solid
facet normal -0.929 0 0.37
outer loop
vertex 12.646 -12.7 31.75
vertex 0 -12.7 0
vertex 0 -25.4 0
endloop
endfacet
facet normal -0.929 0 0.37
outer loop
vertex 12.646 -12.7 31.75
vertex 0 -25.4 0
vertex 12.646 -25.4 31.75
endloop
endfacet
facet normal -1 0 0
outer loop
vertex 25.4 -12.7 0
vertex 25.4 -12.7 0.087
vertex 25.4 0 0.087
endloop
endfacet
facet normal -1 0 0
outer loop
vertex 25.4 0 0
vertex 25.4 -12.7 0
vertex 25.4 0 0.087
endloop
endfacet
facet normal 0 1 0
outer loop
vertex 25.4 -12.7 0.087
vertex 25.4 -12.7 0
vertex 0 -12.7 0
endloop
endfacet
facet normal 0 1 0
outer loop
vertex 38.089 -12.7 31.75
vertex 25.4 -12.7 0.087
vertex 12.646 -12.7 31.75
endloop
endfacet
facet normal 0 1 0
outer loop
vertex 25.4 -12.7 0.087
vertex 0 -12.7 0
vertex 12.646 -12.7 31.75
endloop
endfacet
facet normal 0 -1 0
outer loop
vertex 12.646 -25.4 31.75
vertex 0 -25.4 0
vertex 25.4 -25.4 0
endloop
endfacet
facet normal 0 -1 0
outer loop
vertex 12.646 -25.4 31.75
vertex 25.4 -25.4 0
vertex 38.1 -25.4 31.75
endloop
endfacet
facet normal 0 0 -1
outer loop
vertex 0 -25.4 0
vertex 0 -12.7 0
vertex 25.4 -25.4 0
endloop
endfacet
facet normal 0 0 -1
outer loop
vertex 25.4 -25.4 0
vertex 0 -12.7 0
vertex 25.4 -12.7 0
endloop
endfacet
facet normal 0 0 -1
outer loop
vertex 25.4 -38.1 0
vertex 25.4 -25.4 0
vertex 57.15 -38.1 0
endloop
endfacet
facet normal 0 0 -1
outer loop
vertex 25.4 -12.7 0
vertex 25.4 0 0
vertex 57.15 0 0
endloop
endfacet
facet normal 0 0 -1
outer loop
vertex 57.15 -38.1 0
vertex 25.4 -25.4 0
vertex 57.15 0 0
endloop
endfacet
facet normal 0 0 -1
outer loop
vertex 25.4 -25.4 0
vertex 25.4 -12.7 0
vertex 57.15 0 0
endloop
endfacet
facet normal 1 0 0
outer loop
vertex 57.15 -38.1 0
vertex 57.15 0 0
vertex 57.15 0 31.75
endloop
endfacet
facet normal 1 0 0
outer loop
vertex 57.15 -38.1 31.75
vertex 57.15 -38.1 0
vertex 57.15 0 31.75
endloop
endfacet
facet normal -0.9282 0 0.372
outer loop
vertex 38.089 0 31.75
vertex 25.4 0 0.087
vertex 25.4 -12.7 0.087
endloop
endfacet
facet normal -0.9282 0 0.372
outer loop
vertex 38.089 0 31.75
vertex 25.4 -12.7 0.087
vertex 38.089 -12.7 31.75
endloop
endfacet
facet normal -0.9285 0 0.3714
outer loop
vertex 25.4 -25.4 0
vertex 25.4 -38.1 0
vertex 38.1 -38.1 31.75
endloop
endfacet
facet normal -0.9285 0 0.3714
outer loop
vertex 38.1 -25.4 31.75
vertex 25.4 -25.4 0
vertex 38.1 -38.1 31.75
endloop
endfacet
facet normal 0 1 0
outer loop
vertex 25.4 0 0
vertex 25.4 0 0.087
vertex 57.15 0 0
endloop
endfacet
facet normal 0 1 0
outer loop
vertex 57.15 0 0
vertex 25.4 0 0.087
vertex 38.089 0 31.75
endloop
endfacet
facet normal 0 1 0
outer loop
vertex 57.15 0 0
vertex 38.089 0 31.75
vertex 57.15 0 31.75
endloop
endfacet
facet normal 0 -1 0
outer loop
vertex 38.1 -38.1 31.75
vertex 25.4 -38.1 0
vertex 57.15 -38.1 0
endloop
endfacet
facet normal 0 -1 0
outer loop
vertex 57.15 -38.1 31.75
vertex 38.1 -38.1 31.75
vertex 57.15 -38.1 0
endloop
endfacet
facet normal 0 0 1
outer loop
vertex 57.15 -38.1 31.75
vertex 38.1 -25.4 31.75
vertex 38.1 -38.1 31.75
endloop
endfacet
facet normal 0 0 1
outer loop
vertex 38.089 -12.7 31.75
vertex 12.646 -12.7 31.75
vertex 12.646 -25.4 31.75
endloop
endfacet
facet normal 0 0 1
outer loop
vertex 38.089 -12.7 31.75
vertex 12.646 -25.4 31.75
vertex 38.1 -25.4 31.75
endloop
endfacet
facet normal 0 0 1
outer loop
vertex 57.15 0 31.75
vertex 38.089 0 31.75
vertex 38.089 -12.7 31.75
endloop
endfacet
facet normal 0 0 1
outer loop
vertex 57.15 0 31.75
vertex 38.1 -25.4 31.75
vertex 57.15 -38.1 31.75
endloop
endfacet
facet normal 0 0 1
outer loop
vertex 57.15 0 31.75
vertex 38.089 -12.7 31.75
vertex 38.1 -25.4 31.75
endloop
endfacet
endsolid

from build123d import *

# Parameters (mm, degrees)
F0_W      = 57.15
F0_H      = 31.75
F1_DEPTH  = 38.1
F3_DEPTH  = 64.77
F4_W      = 12.7
F4_H      = 32.225172
F5_DEPTH  = 25.4
F7_DEPTH  = 12.7
F9_DEPTH  = 12.7
F11_DEPTH = 12.7


with BuildPart() as f1:
    # F0 (on Front) → F1 (new body)
    with BuildSketch(Plane.XZ):
        with Locations((28.575, 15.875)):
            Rectangle(F0_W, F0_H)
    extrude(amount=F1_DEPTH)

    # F2 (on Front) → F3 (cut)
    with BuildSketch(Plane.XZ):
        Polygon((0, 0), (12.7, 31.884328), (0, 31.884328), align=None)
    extrude(amount=F3_DEPTH, mode=Mode.SUBTRACT)

    # F4 (on Right) → F5 (cut)
    with BuildSketch(Plane.YZ):
        with Locations((-6.35, 16.112586)):
            Rectangle(F4_W, F4_H)
        Polygon((-25.4, 0), (-25.4, 32.225172), (-38.1, 32.225172), (-38.209904, 0), align=None)
    extrude(amount=F5_DEPTH, mode=Mode.SUBTRACT)

    # F6 (on Front) → F7 (cut)
    with BuildSketch(Plane.XZ):
        Polygon((38.103979, 31.787962), (25.397928, 31.787962), (25.365233, 0), align=None)
    extrude(amount=F7_DEPTH, mode=Mode.SUBTRACT)

    # F8 (on Front) → F9 (cut)
    with BuildSketch(Plane.XZ):
        Polygon((75.160764, -53.294525), (61.148994, -53.294525), (61.104827, -85.576326), (79.001695, -128.796339), (79.001695, -96.281484), (93.439646, -96.281484), align=None)
        Polygon((94.494686, -128.999516), (93.439646, -96.281484), (79.001695, -96.281484), (79.001695, -128.796339), align=None)
    extrude(amount=-F9_DEPTH, mode=Mode.SUBTRACT)

    # F10 (on face) → F11 (cut)
    with BuildSketch(Plane.XZ.offset(38.1)):
        Polygon((25.4, 0), (38.1, 31.75), (25.4, 31.75), align=None)
    extrude(amount=-F11_DEPTH, mode=Mode.SUBTRACT)


solid = f1.part
